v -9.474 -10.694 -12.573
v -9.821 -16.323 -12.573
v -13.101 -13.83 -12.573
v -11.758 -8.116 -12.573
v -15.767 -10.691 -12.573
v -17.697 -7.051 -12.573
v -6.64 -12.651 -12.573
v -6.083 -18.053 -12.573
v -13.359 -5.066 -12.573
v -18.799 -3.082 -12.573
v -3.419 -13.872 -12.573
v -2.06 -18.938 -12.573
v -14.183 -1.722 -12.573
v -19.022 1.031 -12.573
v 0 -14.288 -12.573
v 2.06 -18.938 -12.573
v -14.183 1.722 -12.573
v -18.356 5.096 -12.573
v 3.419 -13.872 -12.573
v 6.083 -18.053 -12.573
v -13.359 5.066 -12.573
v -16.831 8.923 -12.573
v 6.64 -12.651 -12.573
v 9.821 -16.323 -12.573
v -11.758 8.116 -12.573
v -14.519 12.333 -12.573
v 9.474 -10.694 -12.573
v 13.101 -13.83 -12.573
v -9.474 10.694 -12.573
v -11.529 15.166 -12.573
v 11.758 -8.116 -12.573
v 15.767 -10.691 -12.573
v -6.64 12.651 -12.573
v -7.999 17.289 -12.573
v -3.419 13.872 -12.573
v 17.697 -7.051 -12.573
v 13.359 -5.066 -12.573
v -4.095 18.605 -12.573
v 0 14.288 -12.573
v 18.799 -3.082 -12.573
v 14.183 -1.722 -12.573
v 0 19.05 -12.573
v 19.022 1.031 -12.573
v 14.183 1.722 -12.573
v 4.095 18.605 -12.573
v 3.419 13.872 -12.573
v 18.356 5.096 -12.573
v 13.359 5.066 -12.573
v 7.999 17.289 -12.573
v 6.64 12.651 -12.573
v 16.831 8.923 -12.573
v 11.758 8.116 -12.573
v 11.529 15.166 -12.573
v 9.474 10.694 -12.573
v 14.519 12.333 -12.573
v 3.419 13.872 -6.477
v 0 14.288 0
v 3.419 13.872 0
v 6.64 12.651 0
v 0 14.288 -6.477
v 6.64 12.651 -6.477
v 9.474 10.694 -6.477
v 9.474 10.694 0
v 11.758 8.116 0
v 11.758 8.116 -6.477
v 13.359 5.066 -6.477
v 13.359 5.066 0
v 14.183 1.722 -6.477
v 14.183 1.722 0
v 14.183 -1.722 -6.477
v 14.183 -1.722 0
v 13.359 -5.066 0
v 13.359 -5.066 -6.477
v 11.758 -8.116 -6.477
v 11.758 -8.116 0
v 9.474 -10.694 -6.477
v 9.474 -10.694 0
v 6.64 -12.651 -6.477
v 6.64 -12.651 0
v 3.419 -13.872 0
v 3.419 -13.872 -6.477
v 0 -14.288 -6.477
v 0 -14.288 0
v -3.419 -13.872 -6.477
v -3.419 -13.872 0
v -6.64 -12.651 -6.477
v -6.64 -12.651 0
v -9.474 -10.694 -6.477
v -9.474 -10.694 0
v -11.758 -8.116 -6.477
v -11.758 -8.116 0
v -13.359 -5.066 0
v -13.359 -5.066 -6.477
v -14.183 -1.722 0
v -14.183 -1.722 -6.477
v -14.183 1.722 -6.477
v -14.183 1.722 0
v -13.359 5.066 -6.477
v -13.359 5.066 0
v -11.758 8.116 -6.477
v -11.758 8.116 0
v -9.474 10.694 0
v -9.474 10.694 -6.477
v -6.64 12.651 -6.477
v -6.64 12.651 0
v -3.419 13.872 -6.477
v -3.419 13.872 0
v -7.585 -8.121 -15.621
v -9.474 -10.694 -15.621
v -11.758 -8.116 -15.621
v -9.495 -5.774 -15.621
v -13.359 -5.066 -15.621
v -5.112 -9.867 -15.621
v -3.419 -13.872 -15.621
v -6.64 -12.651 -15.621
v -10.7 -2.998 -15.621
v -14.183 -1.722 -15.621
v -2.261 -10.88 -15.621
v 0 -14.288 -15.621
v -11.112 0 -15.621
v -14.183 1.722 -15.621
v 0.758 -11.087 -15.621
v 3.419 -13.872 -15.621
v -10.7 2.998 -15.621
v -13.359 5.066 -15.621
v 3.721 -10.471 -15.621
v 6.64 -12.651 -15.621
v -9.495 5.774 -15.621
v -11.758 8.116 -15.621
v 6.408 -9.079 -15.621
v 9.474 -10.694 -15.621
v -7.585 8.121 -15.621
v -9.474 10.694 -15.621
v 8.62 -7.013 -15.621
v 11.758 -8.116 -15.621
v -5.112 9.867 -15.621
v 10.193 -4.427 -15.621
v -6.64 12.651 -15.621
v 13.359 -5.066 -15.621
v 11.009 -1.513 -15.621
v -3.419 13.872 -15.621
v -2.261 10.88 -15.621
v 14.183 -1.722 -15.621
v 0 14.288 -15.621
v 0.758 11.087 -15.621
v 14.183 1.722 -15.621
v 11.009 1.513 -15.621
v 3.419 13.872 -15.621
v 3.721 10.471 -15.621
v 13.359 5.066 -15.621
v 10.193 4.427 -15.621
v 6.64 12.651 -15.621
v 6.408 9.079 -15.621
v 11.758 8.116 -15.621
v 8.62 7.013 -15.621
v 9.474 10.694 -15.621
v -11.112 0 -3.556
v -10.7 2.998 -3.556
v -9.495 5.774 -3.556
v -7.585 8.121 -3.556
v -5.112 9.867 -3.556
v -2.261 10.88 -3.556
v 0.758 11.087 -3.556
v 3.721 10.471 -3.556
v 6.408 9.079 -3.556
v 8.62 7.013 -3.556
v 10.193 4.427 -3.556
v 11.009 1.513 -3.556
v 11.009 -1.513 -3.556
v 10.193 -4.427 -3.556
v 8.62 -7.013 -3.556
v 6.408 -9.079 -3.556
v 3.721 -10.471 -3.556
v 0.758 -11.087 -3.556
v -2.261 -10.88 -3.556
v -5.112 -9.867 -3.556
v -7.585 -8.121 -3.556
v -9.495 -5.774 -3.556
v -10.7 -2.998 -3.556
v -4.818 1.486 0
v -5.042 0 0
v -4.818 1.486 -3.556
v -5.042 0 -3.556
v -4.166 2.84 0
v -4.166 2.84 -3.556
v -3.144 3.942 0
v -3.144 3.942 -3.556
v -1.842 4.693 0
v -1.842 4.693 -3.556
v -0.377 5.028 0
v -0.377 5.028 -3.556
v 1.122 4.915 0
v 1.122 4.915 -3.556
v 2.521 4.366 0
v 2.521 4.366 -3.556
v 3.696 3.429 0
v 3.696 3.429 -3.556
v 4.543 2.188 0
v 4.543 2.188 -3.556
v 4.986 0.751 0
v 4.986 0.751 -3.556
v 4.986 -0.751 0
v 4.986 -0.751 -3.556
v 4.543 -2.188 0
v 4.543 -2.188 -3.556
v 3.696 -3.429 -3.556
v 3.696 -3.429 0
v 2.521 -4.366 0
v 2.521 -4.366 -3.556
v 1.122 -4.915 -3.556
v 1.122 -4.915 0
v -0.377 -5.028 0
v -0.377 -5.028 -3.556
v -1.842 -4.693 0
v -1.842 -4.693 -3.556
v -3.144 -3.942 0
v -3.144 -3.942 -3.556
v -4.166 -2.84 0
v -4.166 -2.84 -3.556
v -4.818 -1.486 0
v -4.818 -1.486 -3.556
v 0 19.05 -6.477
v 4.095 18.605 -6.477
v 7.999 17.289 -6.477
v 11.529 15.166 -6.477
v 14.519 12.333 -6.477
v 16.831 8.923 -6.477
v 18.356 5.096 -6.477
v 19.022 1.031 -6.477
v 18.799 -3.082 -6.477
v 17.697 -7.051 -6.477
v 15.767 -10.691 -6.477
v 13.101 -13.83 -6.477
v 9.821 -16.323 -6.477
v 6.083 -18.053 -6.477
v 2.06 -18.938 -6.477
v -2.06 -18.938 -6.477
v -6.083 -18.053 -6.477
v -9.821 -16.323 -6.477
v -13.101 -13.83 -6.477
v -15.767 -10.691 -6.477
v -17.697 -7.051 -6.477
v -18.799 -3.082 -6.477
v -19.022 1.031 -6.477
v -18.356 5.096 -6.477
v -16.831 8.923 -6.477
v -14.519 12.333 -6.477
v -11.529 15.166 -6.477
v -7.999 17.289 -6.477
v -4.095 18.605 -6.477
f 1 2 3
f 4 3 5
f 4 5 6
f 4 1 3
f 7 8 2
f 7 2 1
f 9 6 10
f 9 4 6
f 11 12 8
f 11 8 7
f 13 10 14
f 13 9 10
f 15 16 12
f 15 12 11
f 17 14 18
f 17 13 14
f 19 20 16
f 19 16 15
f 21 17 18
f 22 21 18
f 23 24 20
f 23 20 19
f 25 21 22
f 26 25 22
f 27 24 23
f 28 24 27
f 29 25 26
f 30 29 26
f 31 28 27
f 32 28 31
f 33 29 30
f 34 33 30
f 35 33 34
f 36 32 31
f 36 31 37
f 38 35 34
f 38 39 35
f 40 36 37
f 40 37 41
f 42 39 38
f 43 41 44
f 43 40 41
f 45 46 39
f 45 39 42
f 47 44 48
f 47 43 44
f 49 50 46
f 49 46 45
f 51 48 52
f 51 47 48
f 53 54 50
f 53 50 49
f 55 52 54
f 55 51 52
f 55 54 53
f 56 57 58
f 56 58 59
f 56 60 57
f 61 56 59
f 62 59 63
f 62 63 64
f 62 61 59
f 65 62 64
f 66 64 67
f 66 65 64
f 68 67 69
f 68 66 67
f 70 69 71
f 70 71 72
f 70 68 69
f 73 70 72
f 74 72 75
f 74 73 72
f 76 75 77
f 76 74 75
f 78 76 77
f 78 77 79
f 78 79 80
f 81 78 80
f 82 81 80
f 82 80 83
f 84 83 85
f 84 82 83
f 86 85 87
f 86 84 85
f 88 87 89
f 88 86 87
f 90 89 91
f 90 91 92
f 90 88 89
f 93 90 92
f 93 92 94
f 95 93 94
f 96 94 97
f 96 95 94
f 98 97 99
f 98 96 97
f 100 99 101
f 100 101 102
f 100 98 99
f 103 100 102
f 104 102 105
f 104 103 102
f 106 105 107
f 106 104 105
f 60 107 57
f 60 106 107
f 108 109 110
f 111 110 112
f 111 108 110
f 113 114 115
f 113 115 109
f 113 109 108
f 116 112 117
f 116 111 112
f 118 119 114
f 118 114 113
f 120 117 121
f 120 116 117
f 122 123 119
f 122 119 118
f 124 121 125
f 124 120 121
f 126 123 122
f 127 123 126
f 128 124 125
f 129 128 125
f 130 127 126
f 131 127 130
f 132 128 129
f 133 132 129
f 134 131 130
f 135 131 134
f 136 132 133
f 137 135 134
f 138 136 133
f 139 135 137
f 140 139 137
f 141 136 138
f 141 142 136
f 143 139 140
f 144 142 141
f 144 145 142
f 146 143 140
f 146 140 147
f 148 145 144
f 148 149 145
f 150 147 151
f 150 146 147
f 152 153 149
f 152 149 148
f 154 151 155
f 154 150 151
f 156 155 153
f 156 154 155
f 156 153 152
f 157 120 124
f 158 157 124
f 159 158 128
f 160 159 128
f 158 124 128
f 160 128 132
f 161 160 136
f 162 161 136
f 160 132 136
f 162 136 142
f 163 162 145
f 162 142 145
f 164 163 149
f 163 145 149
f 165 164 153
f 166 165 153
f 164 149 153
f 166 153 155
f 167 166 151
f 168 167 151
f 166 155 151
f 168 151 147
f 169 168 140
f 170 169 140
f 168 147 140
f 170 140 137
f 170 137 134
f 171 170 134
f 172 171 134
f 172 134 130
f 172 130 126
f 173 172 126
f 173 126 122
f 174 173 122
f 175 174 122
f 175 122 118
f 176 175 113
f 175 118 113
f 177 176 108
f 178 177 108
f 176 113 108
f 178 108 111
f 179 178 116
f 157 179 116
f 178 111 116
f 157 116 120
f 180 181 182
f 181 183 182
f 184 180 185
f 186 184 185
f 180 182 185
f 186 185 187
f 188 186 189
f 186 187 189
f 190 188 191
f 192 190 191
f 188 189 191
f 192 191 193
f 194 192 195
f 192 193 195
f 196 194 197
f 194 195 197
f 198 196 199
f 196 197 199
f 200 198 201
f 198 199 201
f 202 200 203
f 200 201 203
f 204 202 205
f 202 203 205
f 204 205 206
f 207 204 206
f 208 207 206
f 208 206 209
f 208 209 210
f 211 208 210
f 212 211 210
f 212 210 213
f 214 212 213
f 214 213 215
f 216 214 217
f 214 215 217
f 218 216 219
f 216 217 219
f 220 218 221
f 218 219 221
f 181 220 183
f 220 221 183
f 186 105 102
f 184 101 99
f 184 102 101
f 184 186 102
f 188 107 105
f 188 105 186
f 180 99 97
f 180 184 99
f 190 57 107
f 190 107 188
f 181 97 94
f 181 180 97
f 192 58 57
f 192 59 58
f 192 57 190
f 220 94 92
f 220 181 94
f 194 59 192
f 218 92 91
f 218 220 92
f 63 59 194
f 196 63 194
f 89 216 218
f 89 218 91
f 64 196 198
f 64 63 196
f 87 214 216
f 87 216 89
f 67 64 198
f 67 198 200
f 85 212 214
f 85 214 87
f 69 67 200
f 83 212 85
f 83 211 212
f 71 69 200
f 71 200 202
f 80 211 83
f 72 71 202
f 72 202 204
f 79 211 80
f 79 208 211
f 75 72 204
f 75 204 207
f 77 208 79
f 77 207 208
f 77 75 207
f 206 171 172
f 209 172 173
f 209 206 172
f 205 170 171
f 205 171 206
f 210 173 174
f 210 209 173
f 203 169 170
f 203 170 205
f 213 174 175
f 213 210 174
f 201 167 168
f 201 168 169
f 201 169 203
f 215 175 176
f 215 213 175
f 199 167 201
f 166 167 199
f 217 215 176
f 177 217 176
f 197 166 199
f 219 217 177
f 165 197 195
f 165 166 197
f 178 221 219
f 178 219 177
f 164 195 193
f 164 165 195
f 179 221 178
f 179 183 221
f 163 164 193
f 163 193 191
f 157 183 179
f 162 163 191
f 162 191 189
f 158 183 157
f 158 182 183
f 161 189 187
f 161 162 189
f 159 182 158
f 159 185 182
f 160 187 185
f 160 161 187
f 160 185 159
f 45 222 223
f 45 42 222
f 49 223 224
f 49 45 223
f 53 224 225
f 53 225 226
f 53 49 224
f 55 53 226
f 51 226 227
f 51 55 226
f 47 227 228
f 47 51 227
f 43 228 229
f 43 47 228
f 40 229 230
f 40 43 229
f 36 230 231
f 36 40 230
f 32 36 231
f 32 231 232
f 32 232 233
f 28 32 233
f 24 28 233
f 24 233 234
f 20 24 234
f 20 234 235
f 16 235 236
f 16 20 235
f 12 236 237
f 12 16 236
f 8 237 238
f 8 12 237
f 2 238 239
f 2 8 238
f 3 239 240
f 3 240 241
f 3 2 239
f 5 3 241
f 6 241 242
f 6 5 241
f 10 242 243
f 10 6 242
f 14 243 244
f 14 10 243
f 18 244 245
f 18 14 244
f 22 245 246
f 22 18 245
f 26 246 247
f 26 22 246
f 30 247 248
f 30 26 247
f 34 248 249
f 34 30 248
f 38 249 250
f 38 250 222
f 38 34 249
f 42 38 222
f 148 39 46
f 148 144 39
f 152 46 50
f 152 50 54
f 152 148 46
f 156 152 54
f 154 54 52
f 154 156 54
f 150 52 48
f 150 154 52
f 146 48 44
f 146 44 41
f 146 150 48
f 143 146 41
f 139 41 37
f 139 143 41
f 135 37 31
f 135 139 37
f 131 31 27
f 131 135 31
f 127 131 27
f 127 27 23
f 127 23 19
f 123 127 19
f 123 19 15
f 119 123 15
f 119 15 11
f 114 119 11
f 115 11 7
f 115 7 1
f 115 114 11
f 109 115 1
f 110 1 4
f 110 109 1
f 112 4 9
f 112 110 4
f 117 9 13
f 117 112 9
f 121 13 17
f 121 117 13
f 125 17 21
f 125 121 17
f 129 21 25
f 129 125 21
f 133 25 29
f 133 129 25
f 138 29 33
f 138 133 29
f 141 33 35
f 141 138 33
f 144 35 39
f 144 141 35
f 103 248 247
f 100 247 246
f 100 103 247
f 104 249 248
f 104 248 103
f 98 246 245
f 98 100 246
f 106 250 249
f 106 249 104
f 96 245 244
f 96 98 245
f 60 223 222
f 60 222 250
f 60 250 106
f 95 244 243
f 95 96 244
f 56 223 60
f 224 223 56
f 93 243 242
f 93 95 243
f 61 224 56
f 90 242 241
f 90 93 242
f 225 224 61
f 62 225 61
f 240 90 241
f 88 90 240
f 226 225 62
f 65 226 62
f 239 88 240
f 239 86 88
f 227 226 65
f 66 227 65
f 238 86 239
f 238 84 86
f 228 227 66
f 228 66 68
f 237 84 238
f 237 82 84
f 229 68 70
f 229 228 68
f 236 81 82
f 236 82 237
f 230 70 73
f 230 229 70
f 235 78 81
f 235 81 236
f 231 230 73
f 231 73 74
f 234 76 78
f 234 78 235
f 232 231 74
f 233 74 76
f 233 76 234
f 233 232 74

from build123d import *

# Parameters (mm, degrees)
F_3_8_CLEARANCE_HOLE1_D     = 10.0838
F_3_8_CLEARANCE_HOLE1_DEPTH = 15.621
SKETCH7_R                   = 11.1125
CUT_EXTRUDE2_DEPTH          = 12.065


with BuildPart() as part:
    # Sketch1 → Revolve1 (revolve)
    with BuildSketch(Plane(origin=(0, 0, 0), x_dir=(0, 0, -1), z_dir=(1, 0, 0))):
        Polygon((0, 0), (0, 14.2875), (6.477, 14.2875), (6.477, 19.05), (12.573, 19.05), (12.573, 14.2875), (15.621, 14.2875), (15.621, 0), align=None)
    revolve(axis=Axis((0, 0, 13.696708861), (0, 0, -1)))

    # 3/8 Clearance Hole1
    with Locations(Plane.XY):
        with Locations((0, 0)):
            Hole(F_3_8_CLEARANCE_HOLE1_D / 2, depth=F_3_8_CLEARANCE_HOLE1_DEPTH)

    # Sketch7 → Cut-Extrude2 (cut)
    with BuildSketch(Plane(origin=(0, 0, -15.621), x_dir=(-1, 0, 0), z_dir=(0, 0, -1))):
        Circle(SKETCH7_R)
    extrude(amount=-CUT_EXTRUDE2_DEPTH, mode=Mode.SUBTRACT)


solid = part.part
